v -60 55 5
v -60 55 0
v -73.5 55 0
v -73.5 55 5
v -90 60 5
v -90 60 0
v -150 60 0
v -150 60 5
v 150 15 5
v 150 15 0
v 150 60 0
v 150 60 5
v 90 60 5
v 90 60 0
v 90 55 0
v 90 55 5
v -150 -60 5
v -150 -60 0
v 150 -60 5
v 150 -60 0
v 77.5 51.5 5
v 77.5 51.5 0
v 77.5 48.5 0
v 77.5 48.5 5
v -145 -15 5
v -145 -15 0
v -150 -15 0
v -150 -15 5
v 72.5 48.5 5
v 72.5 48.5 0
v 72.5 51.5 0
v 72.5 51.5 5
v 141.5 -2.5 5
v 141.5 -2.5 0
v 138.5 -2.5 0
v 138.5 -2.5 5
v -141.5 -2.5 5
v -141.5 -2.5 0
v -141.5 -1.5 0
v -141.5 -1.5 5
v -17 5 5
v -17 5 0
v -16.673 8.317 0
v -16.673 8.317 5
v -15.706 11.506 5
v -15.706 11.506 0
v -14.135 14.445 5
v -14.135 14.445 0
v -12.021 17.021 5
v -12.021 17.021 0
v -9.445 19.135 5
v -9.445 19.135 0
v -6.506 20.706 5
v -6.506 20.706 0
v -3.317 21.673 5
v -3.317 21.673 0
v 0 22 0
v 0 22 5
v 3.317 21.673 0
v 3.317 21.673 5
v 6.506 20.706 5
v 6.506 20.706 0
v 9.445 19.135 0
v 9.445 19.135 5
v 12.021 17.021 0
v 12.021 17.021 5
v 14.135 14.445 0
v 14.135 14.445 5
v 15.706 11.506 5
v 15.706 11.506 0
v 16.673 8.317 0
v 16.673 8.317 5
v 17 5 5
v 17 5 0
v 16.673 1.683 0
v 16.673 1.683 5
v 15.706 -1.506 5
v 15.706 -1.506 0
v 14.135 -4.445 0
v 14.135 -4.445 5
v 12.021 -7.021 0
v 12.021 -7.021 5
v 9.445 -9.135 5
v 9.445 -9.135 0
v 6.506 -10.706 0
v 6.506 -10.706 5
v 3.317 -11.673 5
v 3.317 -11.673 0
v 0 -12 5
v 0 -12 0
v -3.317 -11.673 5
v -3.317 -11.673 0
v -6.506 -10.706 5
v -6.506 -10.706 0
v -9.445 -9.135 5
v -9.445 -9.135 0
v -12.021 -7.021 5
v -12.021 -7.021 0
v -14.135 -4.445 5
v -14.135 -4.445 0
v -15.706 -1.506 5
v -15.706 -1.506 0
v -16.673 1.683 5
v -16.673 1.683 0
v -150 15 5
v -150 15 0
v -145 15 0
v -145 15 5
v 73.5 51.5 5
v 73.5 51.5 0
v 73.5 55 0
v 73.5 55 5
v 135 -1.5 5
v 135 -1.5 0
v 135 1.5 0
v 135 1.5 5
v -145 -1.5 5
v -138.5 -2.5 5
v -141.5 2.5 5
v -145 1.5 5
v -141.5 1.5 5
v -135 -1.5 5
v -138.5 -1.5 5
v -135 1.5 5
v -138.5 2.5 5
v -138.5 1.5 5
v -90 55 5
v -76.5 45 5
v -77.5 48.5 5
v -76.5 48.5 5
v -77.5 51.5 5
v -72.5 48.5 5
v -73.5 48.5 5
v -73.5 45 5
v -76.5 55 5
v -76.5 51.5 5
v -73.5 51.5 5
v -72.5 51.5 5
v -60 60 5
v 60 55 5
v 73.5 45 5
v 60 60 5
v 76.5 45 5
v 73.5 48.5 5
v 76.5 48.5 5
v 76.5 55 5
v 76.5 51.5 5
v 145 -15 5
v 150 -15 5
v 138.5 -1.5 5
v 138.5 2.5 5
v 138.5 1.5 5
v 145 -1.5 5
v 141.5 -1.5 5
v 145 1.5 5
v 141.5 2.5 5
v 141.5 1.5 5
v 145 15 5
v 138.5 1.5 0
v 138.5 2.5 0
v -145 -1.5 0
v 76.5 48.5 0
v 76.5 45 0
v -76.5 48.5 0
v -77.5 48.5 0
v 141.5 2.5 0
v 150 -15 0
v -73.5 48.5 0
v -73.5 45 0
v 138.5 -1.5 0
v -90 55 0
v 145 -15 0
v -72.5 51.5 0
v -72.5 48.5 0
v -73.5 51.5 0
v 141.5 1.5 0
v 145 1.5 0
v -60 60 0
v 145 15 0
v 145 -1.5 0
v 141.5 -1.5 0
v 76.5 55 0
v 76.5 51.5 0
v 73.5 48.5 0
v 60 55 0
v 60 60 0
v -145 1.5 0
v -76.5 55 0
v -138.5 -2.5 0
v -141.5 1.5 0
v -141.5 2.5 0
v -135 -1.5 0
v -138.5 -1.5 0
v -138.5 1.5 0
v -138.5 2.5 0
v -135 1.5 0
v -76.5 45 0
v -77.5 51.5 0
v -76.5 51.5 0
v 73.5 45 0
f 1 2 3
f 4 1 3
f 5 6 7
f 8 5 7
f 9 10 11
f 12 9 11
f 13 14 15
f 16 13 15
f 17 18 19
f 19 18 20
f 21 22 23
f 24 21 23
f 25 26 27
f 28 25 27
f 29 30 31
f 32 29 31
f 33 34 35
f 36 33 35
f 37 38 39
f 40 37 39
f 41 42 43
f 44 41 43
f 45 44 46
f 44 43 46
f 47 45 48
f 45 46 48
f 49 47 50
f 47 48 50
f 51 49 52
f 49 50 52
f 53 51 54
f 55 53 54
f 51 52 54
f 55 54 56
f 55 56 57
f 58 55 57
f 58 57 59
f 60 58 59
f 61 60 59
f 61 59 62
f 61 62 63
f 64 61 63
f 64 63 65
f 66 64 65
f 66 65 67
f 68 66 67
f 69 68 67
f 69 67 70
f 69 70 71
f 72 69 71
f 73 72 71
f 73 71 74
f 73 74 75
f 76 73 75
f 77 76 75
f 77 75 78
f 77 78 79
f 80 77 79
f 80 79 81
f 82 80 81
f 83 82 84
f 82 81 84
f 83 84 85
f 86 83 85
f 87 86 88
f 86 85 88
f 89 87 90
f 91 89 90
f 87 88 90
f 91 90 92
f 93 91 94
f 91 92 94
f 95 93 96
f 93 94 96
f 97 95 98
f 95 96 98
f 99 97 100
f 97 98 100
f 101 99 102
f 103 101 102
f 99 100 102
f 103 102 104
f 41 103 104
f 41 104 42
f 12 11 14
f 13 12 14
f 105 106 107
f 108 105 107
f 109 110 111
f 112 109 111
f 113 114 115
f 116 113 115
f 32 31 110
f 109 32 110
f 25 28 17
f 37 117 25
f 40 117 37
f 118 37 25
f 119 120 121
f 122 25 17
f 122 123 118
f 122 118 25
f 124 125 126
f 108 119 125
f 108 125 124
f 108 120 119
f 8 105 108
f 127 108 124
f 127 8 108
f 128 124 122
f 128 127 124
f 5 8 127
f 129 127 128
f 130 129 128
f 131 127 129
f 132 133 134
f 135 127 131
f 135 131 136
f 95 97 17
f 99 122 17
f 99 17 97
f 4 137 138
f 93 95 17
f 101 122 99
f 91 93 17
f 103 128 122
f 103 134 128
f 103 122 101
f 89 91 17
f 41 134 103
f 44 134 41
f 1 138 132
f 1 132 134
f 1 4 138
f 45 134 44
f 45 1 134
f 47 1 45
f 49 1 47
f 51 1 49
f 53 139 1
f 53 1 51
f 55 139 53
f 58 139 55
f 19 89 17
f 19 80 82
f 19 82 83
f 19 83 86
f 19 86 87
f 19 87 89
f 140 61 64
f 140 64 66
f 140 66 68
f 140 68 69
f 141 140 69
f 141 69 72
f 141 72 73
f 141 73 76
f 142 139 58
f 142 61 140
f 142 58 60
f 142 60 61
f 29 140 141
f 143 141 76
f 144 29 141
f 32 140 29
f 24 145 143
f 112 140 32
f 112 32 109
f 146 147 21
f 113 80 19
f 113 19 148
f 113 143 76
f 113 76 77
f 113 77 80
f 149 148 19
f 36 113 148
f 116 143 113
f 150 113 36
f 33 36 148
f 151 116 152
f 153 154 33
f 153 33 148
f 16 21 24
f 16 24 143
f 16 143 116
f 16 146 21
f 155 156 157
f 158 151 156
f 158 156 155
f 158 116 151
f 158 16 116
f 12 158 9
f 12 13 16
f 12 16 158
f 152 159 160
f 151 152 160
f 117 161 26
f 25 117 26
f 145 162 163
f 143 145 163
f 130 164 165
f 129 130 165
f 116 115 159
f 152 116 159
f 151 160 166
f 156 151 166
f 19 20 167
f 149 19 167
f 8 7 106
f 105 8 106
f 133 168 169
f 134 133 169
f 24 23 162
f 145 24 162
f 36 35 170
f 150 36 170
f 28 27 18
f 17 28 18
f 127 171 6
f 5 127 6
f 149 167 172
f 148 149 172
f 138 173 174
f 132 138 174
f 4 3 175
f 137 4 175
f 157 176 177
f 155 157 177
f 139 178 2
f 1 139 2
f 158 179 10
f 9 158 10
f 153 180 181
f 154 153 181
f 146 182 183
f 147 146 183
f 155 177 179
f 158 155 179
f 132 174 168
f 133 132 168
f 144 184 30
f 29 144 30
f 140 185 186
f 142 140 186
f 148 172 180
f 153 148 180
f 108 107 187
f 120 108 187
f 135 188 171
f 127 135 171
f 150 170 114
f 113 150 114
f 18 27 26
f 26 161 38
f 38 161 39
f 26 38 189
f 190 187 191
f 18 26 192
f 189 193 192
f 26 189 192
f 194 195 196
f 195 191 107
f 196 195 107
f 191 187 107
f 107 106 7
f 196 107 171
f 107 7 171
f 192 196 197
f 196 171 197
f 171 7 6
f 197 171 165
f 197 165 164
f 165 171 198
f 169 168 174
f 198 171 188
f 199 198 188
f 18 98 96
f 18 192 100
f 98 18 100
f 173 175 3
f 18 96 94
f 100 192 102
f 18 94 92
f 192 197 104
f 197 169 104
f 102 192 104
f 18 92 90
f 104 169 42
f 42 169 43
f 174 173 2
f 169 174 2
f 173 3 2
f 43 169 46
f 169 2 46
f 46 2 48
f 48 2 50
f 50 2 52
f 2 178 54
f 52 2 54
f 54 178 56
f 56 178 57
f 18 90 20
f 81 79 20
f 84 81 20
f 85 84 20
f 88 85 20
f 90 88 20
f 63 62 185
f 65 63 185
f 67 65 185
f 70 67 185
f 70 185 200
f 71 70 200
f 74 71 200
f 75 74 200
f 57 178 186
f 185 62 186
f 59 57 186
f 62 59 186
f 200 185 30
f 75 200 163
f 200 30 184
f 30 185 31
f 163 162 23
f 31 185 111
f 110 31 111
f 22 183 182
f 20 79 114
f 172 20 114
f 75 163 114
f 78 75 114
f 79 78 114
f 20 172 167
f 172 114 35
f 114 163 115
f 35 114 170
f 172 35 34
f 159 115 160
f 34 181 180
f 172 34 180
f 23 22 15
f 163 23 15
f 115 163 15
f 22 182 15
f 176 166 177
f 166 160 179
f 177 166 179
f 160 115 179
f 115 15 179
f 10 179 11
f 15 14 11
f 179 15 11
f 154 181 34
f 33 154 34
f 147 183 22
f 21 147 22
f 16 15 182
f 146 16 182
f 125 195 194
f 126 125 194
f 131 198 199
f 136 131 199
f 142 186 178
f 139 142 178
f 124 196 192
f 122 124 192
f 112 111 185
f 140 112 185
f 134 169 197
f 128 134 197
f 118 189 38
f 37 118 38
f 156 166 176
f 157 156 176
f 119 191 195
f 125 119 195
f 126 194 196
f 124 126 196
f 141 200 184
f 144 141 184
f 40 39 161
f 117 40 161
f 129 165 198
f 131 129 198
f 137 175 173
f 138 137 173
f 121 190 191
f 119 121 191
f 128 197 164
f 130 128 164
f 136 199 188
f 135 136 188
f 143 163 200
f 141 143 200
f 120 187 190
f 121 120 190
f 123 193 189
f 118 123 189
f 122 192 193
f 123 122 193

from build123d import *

# Parameters (mm, degrees)
BOSS_EXTRU_1_DEPTH      = 5
ESQUISSE2_R             = 17
ENL_V_MAT_EXTRU_1_DEPTH = 162.632298752


with BuildPart() as part:
    # Esquisse1 → Boss.-Extru.1 (new body)
    with BuildSketch(Plane.XY):
        Polygon((-90, 60), (-150, 60), (-150, 15), (-145, 15), (-145, 1.5), (-141.5, 1.5), (-141.5, 2.5), (-138.5, 2.5), (-138.5, 1.5), (-135, 1.5), (-135, -1.5), (-138.5, -1.5), (-138.5, -2.5), (-141.5, -2.5), (-141.5, -1.5), (-145, -1.5), (-145, -15), (-150, -15), (-150, -60), (-90, -60), (-60, -60), (60, -60), (90, -60), (150, -60), (150, -15), (145, -15), (145, -1.5), (141.5, -1.5), (141.5, -2.5), (138.5, -2.5), (138.5, -1.5), (135, -1.5), (135, 1.5), (138.5, 1.5), (138.5, 2.5), (141.5, 2.5), (141.5, 1.5), (145, 1.5), (145, 15), (150, 15), (150, 60), (90, 60), (90, 55), (76.5, 55), (76.5, 51.5), (77.5, 51.5), (77.5, 48.5), (76.5, 48.5), (76.5, 45), (73.5, 45), (73.5, 48.5), (72.5, 48.5), (72.5, 51.5), (73.5, 51.5), (73.5, 55), (60, 55), (60, 60), (-60, 60), (-60, 55), (-73.5, 55), (-73.5, 51.5), (-72.5, 51.5), (-72.5, 48.5), (-73.5, 48.5), (-73.5, 45), (-76.5, 45), (-76.5, 48.5), (-77.5, 48.5), (-77.5, 51.5), (-76.5, 51.5), (-76.5, 55), (-90, 55), align=None)
    extrude(amount=BOSS_EXTRU_1_DEPTH)

    # Esquisse2 → Enlèv. mat.-Extru.1 (cut, through all)
    with BuildSketch(Plane(origin=(0, 0, 0), x_dir=(-1, 0, 0), z_dir=(0, 0, -1))):
        with Locations((0, 5)):
            Circle(ESQUISSE2_R)
    extrude(amount=-ENL_V_MAT_EXTRU_1_DEPTH, mode=Mode.SUBTRACT)


solid = part.part
